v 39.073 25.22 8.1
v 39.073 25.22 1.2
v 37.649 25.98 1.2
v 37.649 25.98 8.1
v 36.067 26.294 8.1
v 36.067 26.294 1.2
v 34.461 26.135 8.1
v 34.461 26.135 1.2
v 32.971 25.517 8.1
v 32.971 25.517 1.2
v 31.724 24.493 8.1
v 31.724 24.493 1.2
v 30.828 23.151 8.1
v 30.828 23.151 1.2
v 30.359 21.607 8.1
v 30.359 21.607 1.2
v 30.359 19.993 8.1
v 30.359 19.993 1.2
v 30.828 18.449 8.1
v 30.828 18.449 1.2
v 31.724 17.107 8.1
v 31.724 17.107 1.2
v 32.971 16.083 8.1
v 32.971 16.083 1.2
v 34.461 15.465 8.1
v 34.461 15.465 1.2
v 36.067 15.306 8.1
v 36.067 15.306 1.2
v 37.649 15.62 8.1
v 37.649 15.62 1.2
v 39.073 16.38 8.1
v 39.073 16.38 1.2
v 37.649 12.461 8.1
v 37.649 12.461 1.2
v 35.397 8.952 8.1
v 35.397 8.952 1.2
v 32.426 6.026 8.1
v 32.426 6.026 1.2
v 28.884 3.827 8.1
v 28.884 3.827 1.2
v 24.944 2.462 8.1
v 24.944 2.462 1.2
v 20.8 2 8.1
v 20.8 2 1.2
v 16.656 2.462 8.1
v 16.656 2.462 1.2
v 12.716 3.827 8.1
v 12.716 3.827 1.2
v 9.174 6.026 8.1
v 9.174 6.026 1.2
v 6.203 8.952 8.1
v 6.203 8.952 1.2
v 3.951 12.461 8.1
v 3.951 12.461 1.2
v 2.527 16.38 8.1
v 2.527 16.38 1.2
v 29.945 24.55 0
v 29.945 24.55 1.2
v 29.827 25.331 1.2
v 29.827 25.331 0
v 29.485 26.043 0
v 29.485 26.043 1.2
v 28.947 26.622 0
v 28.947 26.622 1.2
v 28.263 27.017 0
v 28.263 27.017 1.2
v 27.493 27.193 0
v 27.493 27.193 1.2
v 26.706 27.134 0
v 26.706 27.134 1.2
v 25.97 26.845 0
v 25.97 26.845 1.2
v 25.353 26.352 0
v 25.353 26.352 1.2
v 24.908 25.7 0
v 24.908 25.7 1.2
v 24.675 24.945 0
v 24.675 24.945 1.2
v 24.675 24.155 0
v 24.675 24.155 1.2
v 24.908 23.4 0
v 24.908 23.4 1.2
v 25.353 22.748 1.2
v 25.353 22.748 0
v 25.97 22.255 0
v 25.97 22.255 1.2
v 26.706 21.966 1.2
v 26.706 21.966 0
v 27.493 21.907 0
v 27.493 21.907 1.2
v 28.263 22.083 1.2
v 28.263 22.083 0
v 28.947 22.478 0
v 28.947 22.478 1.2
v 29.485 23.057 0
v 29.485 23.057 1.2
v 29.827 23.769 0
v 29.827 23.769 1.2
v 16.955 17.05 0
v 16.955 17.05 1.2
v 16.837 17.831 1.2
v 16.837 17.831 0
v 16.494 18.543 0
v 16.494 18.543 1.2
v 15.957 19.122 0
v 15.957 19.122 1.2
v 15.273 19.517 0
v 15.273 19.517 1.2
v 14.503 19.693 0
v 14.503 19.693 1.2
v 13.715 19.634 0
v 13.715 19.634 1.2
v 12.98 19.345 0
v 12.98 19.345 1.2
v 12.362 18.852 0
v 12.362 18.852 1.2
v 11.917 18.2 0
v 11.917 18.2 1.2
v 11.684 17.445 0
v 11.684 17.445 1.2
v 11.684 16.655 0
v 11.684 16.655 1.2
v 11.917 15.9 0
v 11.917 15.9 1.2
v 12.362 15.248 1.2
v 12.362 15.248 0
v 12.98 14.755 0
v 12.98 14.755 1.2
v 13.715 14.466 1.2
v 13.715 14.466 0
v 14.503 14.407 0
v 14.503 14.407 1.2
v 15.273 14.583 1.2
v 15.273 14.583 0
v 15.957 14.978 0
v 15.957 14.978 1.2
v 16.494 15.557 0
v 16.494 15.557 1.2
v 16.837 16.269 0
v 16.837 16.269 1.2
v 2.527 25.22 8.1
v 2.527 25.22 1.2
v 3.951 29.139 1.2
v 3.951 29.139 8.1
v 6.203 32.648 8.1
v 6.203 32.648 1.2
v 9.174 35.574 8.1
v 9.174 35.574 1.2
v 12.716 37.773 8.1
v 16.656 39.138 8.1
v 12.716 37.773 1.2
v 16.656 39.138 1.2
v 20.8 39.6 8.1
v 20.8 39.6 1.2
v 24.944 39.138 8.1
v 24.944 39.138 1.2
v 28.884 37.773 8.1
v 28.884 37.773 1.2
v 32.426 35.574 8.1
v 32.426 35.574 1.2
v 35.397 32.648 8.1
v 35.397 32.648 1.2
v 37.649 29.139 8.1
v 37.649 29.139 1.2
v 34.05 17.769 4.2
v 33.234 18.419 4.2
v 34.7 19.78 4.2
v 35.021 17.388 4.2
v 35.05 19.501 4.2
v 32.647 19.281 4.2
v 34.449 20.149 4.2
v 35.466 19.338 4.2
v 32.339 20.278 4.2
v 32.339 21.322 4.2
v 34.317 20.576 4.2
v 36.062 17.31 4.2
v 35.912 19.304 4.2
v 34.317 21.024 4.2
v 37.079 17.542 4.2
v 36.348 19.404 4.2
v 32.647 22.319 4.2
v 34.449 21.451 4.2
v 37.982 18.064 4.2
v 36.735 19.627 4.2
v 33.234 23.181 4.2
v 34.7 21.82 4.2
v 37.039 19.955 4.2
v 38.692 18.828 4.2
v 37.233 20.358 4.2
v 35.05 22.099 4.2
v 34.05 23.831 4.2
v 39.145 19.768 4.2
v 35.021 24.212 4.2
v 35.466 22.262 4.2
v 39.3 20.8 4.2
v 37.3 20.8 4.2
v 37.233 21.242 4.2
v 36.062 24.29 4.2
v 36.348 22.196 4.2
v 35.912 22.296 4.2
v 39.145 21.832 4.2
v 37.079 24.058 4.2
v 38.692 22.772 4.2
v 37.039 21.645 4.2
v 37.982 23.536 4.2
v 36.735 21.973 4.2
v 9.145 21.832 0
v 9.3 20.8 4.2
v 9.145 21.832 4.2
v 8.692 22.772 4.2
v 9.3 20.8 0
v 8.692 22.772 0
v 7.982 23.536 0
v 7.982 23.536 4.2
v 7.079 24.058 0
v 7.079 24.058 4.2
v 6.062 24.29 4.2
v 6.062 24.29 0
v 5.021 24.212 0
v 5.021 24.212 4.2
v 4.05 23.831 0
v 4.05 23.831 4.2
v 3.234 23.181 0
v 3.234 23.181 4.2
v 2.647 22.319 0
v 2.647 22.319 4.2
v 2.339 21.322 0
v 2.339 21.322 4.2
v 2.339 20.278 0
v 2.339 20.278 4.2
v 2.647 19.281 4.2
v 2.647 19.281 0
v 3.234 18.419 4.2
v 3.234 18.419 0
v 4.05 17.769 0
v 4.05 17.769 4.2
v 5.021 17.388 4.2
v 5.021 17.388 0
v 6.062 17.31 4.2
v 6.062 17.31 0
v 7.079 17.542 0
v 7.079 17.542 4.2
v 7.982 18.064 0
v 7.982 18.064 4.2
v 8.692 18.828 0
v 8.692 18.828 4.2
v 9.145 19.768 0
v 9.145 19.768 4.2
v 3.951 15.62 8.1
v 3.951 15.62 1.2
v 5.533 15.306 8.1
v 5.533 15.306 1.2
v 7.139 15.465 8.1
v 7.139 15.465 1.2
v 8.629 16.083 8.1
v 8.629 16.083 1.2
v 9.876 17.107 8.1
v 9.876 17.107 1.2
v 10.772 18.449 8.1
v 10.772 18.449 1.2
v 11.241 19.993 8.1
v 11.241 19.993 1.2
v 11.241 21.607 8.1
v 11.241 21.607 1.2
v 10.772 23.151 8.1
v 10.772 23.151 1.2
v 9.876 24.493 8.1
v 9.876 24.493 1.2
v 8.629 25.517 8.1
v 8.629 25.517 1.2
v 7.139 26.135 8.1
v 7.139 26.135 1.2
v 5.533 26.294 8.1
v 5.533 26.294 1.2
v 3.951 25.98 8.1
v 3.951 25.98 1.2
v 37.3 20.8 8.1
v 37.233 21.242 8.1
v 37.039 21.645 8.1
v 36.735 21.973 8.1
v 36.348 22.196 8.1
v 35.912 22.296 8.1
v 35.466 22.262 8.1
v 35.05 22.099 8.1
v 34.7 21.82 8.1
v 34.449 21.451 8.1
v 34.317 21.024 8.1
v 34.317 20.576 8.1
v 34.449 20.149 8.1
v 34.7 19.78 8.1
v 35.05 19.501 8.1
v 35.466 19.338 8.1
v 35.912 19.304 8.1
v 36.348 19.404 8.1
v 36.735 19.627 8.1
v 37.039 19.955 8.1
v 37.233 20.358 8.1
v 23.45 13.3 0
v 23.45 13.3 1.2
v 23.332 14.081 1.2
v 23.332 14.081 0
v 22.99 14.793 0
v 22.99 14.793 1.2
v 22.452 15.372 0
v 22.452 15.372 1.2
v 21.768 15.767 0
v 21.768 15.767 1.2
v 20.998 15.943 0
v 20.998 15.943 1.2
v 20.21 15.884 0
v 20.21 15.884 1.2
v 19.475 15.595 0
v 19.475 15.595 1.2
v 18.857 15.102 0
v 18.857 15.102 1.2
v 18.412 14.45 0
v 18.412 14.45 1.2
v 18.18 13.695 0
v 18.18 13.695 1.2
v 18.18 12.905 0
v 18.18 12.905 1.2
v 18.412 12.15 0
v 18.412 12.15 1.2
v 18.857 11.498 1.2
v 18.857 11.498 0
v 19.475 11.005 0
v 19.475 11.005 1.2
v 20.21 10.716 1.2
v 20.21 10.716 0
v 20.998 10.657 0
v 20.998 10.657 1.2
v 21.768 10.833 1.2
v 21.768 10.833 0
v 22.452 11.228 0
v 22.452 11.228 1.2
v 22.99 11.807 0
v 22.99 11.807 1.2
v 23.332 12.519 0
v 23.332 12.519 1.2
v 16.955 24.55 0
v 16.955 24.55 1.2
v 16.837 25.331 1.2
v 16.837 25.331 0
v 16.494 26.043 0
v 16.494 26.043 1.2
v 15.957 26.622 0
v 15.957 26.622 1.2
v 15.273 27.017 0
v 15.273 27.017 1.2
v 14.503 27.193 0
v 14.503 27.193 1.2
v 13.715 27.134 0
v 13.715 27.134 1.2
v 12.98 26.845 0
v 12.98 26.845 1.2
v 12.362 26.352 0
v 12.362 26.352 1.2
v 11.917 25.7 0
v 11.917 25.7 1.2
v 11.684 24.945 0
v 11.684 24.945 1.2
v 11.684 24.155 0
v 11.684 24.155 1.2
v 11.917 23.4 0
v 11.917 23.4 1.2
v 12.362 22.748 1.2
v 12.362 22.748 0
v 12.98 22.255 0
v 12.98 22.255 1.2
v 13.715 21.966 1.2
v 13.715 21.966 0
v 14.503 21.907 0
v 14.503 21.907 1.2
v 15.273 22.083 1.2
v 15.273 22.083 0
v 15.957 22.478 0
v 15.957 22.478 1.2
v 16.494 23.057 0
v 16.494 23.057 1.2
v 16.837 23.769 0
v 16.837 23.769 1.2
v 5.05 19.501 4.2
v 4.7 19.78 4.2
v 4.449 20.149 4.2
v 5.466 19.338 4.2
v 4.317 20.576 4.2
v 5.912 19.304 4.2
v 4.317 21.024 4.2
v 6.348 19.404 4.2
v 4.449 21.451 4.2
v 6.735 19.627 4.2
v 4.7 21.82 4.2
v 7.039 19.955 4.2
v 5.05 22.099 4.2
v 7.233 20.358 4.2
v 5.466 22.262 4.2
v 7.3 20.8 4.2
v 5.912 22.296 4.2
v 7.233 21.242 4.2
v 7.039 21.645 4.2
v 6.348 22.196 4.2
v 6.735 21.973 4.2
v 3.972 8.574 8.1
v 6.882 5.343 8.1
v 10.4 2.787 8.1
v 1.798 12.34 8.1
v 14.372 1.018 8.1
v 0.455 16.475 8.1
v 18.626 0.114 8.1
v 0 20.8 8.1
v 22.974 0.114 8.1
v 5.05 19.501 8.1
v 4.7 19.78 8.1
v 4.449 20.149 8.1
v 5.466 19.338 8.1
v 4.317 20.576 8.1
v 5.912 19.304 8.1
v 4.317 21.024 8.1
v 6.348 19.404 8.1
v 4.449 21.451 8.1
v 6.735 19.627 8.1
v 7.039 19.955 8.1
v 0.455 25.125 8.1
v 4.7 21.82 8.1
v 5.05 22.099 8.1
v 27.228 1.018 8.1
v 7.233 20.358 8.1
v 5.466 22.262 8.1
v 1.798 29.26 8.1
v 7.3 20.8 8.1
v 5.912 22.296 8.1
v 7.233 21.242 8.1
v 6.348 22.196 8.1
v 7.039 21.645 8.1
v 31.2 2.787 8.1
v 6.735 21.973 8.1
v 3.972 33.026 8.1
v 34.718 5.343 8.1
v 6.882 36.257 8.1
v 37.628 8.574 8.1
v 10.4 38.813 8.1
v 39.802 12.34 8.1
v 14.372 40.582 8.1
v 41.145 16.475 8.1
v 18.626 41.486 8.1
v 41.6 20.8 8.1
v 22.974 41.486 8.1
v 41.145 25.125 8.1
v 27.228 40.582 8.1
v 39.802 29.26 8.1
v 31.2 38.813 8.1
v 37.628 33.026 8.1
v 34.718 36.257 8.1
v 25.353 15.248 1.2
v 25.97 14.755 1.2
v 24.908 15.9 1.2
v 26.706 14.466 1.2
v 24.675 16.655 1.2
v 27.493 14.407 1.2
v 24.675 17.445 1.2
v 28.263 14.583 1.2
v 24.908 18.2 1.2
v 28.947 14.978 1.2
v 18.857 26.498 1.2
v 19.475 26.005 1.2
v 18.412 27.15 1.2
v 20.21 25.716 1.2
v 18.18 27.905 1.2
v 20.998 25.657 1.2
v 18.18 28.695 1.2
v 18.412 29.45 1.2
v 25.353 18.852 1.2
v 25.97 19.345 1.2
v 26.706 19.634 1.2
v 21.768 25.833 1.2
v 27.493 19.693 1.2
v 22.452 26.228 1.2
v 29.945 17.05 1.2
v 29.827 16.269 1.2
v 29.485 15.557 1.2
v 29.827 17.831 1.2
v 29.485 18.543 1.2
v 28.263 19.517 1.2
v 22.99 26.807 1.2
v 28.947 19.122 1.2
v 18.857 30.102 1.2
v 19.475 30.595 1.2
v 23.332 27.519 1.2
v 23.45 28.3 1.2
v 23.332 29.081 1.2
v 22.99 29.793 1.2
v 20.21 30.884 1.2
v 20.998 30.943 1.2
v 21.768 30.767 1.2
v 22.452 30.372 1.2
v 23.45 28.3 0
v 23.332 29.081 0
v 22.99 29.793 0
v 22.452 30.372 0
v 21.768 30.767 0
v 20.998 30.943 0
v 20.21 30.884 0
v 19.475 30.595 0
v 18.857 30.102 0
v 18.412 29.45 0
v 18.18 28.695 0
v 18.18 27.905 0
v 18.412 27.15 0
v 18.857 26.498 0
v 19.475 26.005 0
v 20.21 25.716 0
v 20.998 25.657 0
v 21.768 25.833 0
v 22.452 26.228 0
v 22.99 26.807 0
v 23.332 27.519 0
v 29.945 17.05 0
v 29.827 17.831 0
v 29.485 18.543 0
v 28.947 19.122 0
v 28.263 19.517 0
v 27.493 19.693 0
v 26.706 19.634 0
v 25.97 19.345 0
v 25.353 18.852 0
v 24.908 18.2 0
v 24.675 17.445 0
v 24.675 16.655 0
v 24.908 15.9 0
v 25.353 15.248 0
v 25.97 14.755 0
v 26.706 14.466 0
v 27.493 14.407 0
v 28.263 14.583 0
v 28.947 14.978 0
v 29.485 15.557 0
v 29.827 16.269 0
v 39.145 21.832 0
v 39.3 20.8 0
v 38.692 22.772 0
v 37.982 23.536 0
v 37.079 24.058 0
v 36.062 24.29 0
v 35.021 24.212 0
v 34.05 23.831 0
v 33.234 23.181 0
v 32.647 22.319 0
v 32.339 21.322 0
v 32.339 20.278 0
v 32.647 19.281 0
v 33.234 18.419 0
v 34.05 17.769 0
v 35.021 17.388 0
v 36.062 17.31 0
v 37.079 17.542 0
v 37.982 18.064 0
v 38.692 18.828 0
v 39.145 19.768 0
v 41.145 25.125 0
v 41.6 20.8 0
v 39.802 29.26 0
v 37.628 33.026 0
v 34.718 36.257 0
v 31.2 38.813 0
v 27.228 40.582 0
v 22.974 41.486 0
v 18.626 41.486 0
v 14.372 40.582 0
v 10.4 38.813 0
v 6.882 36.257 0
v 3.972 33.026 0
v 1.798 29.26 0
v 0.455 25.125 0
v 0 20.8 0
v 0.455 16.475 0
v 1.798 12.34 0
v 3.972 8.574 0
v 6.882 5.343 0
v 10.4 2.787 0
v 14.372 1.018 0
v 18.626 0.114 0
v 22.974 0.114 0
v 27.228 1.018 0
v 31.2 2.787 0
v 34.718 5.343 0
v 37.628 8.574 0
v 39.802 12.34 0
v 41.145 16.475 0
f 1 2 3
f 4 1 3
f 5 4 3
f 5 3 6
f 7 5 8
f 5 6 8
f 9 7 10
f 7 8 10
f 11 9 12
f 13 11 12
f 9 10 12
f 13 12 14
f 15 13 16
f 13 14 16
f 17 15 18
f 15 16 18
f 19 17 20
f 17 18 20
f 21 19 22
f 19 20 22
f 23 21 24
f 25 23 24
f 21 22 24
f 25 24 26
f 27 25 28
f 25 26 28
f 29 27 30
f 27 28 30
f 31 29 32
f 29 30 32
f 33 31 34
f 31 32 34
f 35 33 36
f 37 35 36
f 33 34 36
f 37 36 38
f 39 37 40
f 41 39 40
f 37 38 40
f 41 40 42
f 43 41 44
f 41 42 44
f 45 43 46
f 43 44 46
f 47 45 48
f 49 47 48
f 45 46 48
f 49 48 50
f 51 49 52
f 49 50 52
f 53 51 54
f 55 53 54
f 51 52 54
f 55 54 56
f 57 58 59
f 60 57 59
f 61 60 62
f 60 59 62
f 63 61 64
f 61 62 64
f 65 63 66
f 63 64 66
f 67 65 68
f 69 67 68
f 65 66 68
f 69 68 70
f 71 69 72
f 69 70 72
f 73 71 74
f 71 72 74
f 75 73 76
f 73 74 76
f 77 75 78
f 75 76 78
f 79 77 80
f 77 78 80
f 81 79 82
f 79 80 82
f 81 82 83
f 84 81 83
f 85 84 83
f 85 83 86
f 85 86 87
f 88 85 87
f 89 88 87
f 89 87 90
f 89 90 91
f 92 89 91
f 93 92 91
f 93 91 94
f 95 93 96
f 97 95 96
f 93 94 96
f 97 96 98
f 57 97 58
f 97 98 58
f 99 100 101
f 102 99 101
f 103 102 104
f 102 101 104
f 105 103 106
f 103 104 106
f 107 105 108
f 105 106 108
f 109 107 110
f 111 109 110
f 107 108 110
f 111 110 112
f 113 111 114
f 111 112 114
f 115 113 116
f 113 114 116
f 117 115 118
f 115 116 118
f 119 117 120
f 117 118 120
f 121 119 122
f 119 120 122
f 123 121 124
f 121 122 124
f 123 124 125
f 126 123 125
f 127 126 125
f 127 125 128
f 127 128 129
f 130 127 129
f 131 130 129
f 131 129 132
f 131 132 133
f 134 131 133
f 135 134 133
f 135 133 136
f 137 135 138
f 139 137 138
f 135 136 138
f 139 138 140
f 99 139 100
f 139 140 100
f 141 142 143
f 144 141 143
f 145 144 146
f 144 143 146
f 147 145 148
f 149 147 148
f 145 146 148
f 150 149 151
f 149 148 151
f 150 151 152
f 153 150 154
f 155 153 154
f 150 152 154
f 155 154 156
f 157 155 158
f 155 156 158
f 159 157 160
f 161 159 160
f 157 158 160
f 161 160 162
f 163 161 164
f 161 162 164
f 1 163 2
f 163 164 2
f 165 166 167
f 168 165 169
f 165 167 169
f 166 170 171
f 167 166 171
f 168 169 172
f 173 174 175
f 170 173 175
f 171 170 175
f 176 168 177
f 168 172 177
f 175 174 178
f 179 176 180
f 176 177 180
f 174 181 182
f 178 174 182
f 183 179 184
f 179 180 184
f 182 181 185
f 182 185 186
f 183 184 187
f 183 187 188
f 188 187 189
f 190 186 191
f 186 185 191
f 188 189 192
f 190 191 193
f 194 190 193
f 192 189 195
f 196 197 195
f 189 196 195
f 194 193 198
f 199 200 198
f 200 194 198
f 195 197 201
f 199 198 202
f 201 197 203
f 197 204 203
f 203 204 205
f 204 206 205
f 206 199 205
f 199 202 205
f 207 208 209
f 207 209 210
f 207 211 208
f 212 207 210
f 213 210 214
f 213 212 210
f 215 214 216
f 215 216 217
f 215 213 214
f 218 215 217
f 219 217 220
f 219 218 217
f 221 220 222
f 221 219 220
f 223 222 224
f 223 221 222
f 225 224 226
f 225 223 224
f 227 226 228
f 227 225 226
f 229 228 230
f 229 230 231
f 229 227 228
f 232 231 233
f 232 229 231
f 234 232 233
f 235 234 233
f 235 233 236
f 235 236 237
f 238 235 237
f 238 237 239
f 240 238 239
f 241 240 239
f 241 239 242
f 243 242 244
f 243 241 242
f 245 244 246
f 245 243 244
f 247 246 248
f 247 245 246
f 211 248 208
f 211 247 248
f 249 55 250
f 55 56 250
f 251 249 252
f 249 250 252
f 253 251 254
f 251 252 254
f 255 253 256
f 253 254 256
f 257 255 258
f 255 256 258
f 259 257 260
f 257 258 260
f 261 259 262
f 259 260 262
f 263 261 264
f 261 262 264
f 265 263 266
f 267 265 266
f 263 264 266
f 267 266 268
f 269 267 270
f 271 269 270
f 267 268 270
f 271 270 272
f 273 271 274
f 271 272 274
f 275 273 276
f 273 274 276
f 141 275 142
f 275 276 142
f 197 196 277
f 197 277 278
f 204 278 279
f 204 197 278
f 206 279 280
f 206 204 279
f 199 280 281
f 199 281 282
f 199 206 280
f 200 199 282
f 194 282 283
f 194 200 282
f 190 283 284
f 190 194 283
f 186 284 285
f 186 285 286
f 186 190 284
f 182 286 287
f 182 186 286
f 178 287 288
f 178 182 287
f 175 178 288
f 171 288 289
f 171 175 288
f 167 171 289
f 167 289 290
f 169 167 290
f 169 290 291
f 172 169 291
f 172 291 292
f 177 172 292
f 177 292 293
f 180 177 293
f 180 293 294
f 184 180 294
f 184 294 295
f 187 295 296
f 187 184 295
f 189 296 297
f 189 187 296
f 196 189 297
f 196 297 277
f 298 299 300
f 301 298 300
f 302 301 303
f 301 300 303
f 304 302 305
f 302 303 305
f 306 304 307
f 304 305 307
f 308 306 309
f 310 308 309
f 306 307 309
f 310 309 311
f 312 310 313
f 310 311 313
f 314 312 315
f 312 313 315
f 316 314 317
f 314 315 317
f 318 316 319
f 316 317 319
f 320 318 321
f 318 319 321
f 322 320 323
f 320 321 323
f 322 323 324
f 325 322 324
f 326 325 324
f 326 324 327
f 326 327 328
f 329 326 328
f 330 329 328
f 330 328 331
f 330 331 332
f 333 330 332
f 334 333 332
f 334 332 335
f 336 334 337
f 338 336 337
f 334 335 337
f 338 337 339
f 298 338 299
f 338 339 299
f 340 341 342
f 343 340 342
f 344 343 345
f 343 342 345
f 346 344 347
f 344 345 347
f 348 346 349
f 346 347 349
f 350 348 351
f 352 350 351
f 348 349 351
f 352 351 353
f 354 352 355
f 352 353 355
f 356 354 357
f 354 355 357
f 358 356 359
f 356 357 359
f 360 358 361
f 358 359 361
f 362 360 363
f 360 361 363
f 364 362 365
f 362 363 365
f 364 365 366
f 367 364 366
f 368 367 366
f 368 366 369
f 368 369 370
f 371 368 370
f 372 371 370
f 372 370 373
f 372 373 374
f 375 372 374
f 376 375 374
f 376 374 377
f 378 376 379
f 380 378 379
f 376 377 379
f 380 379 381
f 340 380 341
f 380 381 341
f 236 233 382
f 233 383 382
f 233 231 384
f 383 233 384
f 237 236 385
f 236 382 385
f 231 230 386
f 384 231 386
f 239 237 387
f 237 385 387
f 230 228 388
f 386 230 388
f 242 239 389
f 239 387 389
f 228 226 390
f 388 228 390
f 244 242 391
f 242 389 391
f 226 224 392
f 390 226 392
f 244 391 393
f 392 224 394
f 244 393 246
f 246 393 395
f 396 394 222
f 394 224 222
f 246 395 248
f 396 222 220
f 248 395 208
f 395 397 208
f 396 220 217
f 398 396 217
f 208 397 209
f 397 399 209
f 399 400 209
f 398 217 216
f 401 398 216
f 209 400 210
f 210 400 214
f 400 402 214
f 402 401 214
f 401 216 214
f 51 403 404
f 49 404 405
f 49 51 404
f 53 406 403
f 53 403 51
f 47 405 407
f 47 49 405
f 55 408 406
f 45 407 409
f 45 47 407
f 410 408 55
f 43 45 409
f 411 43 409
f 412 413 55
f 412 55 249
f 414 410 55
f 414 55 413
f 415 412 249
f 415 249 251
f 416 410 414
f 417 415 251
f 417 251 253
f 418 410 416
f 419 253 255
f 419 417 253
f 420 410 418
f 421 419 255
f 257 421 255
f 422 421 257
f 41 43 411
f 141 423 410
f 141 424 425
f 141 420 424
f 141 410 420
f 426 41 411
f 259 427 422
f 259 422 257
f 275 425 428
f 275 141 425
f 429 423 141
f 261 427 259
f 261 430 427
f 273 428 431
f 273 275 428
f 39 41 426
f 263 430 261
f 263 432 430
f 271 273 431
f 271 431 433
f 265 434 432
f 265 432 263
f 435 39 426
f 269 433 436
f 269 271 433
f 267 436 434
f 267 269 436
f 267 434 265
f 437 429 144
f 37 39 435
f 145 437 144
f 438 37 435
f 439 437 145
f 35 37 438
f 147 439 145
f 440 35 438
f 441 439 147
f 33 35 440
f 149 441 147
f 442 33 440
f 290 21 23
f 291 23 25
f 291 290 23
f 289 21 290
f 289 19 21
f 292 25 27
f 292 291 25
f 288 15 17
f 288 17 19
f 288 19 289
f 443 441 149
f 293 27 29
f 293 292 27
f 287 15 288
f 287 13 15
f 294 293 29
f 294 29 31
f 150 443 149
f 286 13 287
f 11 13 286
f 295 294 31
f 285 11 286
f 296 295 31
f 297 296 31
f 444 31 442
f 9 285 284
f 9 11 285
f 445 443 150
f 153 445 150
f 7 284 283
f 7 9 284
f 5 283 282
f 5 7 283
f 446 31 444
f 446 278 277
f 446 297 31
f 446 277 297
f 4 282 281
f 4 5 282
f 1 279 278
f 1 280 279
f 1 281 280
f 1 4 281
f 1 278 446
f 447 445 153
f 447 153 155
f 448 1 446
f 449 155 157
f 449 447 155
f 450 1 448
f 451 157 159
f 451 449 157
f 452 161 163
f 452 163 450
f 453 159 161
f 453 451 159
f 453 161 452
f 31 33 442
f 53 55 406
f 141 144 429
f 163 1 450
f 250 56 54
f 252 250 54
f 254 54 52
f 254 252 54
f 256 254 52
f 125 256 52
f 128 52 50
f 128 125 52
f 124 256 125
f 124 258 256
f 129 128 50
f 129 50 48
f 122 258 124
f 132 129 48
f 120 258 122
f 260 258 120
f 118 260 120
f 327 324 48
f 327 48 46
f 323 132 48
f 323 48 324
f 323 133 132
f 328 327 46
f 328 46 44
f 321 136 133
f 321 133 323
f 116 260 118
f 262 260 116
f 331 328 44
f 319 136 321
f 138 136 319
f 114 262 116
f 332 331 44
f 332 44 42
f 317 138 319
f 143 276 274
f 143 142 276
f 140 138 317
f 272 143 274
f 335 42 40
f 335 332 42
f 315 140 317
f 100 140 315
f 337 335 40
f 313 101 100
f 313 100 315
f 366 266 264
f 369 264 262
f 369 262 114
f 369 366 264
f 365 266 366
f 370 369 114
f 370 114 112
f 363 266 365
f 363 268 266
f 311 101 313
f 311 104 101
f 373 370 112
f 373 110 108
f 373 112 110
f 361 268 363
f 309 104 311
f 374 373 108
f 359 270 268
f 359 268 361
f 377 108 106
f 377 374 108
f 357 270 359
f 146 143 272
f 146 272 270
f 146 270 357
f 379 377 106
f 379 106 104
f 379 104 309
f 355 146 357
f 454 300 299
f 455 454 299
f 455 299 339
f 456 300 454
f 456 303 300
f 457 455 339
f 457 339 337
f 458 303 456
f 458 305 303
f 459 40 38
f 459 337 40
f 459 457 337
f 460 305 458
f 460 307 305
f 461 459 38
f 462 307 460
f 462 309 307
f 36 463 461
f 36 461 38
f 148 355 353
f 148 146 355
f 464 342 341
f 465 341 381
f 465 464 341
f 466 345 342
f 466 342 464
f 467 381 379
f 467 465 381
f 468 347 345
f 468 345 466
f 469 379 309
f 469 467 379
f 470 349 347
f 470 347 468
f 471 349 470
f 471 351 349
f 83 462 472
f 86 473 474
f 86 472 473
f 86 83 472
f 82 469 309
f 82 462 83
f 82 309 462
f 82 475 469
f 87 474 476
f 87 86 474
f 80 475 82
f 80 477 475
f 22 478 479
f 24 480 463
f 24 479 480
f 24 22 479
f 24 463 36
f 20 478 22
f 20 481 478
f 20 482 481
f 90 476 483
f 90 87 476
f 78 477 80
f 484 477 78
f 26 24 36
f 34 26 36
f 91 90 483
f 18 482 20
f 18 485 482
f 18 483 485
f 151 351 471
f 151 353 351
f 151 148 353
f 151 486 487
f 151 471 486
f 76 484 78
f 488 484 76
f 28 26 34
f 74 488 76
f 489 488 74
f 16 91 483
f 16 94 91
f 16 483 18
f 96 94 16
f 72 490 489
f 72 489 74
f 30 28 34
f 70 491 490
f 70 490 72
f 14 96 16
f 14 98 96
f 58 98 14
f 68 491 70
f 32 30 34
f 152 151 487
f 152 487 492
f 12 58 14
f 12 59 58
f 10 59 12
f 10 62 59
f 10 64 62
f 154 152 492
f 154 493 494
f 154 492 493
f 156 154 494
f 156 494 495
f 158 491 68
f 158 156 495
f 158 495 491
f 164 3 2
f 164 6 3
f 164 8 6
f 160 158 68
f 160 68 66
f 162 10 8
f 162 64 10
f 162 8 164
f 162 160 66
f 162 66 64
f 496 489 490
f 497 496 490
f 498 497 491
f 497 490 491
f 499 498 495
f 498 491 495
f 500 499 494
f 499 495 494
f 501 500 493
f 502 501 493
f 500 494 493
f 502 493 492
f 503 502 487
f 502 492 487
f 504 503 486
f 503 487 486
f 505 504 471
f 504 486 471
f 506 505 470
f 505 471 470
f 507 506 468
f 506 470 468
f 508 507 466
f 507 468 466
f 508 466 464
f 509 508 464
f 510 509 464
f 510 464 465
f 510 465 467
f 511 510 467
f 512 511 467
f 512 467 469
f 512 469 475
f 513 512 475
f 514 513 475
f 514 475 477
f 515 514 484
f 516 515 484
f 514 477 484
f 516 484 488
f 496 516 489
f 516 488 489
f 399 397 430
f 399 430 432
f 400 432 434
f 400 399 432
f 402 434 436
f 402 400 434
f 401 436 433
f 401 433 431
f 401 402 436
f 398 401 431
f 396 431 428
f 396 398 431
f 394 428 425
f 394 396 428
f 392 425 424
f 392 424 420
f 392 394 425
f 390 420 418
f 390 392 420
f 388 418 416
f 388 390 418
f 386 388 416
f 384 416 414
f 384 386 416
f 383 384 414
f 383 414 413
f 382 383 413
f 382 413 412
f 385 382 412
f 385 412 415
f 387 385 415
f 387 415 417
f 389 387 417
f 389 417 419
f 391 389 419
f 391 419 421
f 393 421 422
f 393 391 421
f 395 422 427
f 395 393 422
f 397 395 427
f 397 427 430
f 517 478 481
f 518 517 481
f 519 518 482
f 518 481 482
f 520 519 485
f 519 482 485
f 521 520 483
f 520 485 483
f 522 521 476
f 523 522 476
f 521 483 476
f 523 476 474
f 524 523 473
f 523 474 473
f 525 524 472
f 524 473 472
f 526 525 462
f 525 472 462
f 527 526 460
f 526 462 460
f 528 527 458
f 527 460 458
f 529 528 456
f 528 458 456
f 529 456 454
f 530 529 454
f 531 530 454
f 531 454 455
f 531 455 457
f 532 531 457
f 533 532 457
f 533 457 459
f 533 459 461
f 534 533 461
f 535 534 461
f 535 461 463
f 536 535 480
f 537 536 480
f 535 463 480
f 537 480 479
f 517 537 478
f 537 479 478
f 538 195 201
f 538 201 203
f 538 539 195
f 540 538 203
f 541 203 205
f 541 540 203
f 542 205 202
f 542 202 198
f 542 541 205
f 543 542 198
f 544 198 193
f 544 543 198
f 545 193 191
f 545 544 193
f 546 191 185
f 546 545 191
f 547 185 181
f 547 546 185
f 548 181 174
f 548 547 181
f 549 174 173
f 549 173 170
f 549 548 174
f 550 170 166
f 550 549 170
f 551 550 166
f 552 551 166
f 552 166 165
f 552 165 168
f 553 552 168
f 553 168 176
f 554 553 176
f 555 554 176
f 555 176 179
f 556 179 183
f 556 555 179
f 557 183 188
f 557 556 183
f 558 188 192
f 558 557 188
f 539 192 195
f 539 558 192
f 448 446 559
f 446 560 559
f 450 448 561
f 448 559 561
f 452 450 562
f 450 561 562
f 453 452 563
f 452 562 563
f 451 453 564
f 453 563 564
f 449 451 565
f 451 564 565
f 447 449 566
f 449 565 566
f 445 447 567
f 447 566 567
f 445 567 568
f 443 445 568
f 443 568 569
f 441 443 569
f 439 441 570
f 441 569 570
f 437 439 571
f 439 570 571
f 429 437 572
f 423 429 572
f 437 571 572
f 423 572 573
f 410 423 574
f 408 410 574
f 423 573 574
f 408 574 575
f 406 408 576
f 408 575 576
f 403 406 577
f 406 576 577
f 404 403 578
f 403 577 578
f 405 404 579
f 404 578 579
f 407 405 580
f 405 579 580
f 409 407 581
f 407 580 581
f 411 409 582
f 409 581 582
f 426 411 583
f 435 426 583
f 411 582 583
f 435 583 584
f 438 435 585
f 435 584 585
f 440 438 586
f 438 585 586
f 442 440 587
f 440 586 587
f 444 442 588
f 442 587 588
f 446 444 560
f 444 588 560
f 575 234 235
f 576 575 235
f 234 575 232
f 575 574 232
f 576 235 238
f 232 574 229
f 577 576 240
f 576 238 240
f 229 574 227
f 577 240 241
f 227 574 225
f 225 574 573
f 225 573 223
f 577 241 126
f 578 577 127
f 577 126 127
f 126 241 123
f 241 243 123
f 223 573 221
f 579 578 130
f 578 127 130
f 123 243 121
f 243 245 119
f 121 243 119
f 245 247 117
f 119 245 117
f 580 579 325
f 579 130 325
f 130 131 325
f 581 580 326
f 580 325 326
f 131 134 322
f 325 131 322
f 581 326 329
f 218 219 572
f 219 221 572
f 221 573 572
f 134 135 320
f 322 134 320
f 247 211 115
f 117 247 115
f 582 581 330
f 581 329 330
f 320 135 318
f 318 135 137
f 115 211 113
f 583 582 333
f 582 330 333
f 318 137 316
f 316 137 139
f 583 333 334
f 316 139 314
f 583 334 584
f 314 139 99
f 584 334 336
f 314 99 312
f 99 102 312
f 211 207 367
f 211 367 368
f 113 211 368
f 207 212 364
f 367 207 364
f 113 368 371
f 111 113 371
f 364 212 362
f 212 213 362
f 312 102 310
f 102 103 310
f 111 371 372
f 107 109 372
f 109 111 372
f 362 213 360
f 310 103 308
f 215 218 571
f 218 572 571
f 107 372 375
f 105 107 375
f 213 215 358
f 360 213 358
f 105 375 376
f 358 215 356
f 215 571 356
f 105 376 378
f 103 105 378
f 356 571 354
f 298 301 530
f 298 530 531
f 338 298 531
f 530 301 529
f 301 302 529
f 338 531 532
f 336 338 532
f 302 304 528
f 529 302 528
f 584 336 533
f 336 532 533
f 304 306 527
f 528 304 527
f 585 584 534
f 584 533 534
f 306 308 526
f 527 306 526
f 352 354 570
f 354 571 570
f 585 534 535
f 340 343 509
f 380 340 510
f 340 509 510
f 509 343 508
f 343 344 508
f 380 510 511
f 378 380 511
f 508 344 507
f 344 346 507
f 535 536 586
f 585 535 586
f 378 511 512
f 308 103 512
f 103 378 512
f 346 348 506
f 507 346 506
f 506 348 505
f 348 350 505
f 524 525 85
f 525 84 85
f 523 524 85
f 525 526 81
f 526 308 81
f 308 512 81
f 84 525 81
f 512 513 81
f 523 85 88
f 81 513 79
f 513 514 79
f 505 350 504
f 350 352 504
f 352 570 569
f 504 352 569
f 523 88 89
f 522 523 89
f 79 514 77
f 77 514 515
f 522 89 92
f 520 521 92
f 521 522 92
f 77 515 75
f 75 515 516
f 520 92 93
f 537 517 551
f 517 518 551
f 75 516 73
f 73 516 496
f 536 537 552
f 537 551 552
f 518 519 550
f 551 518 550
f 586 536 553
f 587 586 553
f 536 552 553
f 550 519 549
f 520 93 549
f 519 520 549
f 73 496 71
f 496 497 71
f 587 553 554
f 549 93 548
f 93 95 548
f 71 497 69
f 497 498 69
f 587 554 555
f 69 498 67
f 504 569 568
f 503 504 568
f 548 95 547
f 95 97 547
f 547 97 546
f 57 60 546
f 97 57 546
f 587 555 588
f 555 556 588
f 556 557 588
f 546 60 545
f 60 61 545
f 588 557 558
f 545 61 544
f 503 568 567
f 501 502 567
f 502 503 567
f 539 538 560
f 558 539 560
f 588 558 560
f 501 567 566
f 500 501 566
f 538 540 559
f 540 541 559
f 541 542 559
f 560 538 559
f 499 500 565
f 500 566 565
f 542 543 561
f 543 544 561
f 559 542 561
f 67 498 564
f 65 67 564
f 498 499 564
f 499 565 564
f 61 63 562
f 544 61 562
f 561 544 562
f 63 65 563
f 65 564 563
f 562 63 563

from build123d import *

# Parameters (mm, degrees)
F0_R     = 20.8
F0_R_2   = 3.5
F1_DEPTH = 1.2
F2_R     = 20.8
F2_R_2   = 3.5
F3_DEPTH = 3
F4_R     = 20.8
F4_R_2   = 1.5
F5_DEPTH = 3.9
F6_R     = 2.65
F7_DEPTH = 1.2


with BuildPart() as f1:
    # F0 (on Top) → F1 (new body)
    with BuildSketch(Plane.XY):
        with Locations((20.8, 20.8)):
            Circle(F0_R)
        with Locations((5.8, 20.8)):
            Circle(F0_R_2, mode=Mode.SUBTRACT)
        with Locations((35.8, 20.8)):
            Circle(F0_R_2, mode=Mode.SUBTRACT)
    extrude(amount=F1_DEPTH)

    # F2 (on face) → F3 (join)
    with BuildSketch(Plane.XY.offset(1.2)):
        with Locations((20.8, 20.8)):
            Circle(F2_R)
        with BuildLine():
            ThreePointArc((39.073, 16.379879), (20.8, 2), (2.527, 16.379879))
            ThreePointArc((2.527, 16.379879), (11.3, 20.8), (2.527, 25.220121))
            ThreePointArc((2.527, 25.220121), (20.8, 39.6), (39.073, 25.220121))
            ThreePointArc((39.073, 25.220121), (30.3, 20.8), (39.073, 16.379879))
        make_face(mode=Mode.SUBTRACT)
        with Locations((5.8, 20.8)):
            Circle(F2_R_2, mode=Mode.SUBTRACT)
        with Locations((35.8, 20.8)):
            Circle(F2_R_2, mode=Mode.SUBTRACT)
    extrude(amount=F3_DEPTH)

    # F4 (on face) → F5 (join)
    with BuildSketch(Plane.XY.offset(4.2)):
        with Locations((20.8, 20.8)):
            Circle(F4_R)
        with BuildLine():
            ThreePointArc((39.073, 16.379879), (20.8, 2), (2.527, 16.379879))
            ThreePointArc((2.527, 16.379879), (11.3, 20.8), (2.527, 25.220121))
            ThreePointArc((2.527, 25.220121), (20.8, 39.6), (39.073, 25.220121))
            ThreePointArc((39.073, 25.220121), (30.3, 20.8), (39.073, 16.379879))
        make_face(mode=Mode.SUBTRACT)
        with Locations((5.8, 20.8)):
            Circle(F4_R_2, mode=Mode.SUBTRACT)
        with Locations((35.8, 20.8)):
            Circle(F4_R_2, mode=Mode.SUBTRACT)
    extrude(amount=F5_DEPTH)

    # F6 (on face) → F7 (cut, through all)
    with BuildSketch(Plane.XY.offset(1.2)):
        with Locations((14.304809, 24.55)):
            Circle(F6_R)
        with Locations((20.8, 28.3)):
            Circle(F6_R)
        with Locations((27.295191, 24.55)):
            Circle(F6_R)
        with Locations((27.295191, 17.05)):
            Circle(F6_R)
        with Locations((20.8, 13.3)):
            Circle(F6_R)
        with Locations((14.304809, 17.05)):
            Circle(F6_R)
    extrude(amount=-F7_DEPTH, mode=Mode.SUBTRACT)


solid = f1.part
